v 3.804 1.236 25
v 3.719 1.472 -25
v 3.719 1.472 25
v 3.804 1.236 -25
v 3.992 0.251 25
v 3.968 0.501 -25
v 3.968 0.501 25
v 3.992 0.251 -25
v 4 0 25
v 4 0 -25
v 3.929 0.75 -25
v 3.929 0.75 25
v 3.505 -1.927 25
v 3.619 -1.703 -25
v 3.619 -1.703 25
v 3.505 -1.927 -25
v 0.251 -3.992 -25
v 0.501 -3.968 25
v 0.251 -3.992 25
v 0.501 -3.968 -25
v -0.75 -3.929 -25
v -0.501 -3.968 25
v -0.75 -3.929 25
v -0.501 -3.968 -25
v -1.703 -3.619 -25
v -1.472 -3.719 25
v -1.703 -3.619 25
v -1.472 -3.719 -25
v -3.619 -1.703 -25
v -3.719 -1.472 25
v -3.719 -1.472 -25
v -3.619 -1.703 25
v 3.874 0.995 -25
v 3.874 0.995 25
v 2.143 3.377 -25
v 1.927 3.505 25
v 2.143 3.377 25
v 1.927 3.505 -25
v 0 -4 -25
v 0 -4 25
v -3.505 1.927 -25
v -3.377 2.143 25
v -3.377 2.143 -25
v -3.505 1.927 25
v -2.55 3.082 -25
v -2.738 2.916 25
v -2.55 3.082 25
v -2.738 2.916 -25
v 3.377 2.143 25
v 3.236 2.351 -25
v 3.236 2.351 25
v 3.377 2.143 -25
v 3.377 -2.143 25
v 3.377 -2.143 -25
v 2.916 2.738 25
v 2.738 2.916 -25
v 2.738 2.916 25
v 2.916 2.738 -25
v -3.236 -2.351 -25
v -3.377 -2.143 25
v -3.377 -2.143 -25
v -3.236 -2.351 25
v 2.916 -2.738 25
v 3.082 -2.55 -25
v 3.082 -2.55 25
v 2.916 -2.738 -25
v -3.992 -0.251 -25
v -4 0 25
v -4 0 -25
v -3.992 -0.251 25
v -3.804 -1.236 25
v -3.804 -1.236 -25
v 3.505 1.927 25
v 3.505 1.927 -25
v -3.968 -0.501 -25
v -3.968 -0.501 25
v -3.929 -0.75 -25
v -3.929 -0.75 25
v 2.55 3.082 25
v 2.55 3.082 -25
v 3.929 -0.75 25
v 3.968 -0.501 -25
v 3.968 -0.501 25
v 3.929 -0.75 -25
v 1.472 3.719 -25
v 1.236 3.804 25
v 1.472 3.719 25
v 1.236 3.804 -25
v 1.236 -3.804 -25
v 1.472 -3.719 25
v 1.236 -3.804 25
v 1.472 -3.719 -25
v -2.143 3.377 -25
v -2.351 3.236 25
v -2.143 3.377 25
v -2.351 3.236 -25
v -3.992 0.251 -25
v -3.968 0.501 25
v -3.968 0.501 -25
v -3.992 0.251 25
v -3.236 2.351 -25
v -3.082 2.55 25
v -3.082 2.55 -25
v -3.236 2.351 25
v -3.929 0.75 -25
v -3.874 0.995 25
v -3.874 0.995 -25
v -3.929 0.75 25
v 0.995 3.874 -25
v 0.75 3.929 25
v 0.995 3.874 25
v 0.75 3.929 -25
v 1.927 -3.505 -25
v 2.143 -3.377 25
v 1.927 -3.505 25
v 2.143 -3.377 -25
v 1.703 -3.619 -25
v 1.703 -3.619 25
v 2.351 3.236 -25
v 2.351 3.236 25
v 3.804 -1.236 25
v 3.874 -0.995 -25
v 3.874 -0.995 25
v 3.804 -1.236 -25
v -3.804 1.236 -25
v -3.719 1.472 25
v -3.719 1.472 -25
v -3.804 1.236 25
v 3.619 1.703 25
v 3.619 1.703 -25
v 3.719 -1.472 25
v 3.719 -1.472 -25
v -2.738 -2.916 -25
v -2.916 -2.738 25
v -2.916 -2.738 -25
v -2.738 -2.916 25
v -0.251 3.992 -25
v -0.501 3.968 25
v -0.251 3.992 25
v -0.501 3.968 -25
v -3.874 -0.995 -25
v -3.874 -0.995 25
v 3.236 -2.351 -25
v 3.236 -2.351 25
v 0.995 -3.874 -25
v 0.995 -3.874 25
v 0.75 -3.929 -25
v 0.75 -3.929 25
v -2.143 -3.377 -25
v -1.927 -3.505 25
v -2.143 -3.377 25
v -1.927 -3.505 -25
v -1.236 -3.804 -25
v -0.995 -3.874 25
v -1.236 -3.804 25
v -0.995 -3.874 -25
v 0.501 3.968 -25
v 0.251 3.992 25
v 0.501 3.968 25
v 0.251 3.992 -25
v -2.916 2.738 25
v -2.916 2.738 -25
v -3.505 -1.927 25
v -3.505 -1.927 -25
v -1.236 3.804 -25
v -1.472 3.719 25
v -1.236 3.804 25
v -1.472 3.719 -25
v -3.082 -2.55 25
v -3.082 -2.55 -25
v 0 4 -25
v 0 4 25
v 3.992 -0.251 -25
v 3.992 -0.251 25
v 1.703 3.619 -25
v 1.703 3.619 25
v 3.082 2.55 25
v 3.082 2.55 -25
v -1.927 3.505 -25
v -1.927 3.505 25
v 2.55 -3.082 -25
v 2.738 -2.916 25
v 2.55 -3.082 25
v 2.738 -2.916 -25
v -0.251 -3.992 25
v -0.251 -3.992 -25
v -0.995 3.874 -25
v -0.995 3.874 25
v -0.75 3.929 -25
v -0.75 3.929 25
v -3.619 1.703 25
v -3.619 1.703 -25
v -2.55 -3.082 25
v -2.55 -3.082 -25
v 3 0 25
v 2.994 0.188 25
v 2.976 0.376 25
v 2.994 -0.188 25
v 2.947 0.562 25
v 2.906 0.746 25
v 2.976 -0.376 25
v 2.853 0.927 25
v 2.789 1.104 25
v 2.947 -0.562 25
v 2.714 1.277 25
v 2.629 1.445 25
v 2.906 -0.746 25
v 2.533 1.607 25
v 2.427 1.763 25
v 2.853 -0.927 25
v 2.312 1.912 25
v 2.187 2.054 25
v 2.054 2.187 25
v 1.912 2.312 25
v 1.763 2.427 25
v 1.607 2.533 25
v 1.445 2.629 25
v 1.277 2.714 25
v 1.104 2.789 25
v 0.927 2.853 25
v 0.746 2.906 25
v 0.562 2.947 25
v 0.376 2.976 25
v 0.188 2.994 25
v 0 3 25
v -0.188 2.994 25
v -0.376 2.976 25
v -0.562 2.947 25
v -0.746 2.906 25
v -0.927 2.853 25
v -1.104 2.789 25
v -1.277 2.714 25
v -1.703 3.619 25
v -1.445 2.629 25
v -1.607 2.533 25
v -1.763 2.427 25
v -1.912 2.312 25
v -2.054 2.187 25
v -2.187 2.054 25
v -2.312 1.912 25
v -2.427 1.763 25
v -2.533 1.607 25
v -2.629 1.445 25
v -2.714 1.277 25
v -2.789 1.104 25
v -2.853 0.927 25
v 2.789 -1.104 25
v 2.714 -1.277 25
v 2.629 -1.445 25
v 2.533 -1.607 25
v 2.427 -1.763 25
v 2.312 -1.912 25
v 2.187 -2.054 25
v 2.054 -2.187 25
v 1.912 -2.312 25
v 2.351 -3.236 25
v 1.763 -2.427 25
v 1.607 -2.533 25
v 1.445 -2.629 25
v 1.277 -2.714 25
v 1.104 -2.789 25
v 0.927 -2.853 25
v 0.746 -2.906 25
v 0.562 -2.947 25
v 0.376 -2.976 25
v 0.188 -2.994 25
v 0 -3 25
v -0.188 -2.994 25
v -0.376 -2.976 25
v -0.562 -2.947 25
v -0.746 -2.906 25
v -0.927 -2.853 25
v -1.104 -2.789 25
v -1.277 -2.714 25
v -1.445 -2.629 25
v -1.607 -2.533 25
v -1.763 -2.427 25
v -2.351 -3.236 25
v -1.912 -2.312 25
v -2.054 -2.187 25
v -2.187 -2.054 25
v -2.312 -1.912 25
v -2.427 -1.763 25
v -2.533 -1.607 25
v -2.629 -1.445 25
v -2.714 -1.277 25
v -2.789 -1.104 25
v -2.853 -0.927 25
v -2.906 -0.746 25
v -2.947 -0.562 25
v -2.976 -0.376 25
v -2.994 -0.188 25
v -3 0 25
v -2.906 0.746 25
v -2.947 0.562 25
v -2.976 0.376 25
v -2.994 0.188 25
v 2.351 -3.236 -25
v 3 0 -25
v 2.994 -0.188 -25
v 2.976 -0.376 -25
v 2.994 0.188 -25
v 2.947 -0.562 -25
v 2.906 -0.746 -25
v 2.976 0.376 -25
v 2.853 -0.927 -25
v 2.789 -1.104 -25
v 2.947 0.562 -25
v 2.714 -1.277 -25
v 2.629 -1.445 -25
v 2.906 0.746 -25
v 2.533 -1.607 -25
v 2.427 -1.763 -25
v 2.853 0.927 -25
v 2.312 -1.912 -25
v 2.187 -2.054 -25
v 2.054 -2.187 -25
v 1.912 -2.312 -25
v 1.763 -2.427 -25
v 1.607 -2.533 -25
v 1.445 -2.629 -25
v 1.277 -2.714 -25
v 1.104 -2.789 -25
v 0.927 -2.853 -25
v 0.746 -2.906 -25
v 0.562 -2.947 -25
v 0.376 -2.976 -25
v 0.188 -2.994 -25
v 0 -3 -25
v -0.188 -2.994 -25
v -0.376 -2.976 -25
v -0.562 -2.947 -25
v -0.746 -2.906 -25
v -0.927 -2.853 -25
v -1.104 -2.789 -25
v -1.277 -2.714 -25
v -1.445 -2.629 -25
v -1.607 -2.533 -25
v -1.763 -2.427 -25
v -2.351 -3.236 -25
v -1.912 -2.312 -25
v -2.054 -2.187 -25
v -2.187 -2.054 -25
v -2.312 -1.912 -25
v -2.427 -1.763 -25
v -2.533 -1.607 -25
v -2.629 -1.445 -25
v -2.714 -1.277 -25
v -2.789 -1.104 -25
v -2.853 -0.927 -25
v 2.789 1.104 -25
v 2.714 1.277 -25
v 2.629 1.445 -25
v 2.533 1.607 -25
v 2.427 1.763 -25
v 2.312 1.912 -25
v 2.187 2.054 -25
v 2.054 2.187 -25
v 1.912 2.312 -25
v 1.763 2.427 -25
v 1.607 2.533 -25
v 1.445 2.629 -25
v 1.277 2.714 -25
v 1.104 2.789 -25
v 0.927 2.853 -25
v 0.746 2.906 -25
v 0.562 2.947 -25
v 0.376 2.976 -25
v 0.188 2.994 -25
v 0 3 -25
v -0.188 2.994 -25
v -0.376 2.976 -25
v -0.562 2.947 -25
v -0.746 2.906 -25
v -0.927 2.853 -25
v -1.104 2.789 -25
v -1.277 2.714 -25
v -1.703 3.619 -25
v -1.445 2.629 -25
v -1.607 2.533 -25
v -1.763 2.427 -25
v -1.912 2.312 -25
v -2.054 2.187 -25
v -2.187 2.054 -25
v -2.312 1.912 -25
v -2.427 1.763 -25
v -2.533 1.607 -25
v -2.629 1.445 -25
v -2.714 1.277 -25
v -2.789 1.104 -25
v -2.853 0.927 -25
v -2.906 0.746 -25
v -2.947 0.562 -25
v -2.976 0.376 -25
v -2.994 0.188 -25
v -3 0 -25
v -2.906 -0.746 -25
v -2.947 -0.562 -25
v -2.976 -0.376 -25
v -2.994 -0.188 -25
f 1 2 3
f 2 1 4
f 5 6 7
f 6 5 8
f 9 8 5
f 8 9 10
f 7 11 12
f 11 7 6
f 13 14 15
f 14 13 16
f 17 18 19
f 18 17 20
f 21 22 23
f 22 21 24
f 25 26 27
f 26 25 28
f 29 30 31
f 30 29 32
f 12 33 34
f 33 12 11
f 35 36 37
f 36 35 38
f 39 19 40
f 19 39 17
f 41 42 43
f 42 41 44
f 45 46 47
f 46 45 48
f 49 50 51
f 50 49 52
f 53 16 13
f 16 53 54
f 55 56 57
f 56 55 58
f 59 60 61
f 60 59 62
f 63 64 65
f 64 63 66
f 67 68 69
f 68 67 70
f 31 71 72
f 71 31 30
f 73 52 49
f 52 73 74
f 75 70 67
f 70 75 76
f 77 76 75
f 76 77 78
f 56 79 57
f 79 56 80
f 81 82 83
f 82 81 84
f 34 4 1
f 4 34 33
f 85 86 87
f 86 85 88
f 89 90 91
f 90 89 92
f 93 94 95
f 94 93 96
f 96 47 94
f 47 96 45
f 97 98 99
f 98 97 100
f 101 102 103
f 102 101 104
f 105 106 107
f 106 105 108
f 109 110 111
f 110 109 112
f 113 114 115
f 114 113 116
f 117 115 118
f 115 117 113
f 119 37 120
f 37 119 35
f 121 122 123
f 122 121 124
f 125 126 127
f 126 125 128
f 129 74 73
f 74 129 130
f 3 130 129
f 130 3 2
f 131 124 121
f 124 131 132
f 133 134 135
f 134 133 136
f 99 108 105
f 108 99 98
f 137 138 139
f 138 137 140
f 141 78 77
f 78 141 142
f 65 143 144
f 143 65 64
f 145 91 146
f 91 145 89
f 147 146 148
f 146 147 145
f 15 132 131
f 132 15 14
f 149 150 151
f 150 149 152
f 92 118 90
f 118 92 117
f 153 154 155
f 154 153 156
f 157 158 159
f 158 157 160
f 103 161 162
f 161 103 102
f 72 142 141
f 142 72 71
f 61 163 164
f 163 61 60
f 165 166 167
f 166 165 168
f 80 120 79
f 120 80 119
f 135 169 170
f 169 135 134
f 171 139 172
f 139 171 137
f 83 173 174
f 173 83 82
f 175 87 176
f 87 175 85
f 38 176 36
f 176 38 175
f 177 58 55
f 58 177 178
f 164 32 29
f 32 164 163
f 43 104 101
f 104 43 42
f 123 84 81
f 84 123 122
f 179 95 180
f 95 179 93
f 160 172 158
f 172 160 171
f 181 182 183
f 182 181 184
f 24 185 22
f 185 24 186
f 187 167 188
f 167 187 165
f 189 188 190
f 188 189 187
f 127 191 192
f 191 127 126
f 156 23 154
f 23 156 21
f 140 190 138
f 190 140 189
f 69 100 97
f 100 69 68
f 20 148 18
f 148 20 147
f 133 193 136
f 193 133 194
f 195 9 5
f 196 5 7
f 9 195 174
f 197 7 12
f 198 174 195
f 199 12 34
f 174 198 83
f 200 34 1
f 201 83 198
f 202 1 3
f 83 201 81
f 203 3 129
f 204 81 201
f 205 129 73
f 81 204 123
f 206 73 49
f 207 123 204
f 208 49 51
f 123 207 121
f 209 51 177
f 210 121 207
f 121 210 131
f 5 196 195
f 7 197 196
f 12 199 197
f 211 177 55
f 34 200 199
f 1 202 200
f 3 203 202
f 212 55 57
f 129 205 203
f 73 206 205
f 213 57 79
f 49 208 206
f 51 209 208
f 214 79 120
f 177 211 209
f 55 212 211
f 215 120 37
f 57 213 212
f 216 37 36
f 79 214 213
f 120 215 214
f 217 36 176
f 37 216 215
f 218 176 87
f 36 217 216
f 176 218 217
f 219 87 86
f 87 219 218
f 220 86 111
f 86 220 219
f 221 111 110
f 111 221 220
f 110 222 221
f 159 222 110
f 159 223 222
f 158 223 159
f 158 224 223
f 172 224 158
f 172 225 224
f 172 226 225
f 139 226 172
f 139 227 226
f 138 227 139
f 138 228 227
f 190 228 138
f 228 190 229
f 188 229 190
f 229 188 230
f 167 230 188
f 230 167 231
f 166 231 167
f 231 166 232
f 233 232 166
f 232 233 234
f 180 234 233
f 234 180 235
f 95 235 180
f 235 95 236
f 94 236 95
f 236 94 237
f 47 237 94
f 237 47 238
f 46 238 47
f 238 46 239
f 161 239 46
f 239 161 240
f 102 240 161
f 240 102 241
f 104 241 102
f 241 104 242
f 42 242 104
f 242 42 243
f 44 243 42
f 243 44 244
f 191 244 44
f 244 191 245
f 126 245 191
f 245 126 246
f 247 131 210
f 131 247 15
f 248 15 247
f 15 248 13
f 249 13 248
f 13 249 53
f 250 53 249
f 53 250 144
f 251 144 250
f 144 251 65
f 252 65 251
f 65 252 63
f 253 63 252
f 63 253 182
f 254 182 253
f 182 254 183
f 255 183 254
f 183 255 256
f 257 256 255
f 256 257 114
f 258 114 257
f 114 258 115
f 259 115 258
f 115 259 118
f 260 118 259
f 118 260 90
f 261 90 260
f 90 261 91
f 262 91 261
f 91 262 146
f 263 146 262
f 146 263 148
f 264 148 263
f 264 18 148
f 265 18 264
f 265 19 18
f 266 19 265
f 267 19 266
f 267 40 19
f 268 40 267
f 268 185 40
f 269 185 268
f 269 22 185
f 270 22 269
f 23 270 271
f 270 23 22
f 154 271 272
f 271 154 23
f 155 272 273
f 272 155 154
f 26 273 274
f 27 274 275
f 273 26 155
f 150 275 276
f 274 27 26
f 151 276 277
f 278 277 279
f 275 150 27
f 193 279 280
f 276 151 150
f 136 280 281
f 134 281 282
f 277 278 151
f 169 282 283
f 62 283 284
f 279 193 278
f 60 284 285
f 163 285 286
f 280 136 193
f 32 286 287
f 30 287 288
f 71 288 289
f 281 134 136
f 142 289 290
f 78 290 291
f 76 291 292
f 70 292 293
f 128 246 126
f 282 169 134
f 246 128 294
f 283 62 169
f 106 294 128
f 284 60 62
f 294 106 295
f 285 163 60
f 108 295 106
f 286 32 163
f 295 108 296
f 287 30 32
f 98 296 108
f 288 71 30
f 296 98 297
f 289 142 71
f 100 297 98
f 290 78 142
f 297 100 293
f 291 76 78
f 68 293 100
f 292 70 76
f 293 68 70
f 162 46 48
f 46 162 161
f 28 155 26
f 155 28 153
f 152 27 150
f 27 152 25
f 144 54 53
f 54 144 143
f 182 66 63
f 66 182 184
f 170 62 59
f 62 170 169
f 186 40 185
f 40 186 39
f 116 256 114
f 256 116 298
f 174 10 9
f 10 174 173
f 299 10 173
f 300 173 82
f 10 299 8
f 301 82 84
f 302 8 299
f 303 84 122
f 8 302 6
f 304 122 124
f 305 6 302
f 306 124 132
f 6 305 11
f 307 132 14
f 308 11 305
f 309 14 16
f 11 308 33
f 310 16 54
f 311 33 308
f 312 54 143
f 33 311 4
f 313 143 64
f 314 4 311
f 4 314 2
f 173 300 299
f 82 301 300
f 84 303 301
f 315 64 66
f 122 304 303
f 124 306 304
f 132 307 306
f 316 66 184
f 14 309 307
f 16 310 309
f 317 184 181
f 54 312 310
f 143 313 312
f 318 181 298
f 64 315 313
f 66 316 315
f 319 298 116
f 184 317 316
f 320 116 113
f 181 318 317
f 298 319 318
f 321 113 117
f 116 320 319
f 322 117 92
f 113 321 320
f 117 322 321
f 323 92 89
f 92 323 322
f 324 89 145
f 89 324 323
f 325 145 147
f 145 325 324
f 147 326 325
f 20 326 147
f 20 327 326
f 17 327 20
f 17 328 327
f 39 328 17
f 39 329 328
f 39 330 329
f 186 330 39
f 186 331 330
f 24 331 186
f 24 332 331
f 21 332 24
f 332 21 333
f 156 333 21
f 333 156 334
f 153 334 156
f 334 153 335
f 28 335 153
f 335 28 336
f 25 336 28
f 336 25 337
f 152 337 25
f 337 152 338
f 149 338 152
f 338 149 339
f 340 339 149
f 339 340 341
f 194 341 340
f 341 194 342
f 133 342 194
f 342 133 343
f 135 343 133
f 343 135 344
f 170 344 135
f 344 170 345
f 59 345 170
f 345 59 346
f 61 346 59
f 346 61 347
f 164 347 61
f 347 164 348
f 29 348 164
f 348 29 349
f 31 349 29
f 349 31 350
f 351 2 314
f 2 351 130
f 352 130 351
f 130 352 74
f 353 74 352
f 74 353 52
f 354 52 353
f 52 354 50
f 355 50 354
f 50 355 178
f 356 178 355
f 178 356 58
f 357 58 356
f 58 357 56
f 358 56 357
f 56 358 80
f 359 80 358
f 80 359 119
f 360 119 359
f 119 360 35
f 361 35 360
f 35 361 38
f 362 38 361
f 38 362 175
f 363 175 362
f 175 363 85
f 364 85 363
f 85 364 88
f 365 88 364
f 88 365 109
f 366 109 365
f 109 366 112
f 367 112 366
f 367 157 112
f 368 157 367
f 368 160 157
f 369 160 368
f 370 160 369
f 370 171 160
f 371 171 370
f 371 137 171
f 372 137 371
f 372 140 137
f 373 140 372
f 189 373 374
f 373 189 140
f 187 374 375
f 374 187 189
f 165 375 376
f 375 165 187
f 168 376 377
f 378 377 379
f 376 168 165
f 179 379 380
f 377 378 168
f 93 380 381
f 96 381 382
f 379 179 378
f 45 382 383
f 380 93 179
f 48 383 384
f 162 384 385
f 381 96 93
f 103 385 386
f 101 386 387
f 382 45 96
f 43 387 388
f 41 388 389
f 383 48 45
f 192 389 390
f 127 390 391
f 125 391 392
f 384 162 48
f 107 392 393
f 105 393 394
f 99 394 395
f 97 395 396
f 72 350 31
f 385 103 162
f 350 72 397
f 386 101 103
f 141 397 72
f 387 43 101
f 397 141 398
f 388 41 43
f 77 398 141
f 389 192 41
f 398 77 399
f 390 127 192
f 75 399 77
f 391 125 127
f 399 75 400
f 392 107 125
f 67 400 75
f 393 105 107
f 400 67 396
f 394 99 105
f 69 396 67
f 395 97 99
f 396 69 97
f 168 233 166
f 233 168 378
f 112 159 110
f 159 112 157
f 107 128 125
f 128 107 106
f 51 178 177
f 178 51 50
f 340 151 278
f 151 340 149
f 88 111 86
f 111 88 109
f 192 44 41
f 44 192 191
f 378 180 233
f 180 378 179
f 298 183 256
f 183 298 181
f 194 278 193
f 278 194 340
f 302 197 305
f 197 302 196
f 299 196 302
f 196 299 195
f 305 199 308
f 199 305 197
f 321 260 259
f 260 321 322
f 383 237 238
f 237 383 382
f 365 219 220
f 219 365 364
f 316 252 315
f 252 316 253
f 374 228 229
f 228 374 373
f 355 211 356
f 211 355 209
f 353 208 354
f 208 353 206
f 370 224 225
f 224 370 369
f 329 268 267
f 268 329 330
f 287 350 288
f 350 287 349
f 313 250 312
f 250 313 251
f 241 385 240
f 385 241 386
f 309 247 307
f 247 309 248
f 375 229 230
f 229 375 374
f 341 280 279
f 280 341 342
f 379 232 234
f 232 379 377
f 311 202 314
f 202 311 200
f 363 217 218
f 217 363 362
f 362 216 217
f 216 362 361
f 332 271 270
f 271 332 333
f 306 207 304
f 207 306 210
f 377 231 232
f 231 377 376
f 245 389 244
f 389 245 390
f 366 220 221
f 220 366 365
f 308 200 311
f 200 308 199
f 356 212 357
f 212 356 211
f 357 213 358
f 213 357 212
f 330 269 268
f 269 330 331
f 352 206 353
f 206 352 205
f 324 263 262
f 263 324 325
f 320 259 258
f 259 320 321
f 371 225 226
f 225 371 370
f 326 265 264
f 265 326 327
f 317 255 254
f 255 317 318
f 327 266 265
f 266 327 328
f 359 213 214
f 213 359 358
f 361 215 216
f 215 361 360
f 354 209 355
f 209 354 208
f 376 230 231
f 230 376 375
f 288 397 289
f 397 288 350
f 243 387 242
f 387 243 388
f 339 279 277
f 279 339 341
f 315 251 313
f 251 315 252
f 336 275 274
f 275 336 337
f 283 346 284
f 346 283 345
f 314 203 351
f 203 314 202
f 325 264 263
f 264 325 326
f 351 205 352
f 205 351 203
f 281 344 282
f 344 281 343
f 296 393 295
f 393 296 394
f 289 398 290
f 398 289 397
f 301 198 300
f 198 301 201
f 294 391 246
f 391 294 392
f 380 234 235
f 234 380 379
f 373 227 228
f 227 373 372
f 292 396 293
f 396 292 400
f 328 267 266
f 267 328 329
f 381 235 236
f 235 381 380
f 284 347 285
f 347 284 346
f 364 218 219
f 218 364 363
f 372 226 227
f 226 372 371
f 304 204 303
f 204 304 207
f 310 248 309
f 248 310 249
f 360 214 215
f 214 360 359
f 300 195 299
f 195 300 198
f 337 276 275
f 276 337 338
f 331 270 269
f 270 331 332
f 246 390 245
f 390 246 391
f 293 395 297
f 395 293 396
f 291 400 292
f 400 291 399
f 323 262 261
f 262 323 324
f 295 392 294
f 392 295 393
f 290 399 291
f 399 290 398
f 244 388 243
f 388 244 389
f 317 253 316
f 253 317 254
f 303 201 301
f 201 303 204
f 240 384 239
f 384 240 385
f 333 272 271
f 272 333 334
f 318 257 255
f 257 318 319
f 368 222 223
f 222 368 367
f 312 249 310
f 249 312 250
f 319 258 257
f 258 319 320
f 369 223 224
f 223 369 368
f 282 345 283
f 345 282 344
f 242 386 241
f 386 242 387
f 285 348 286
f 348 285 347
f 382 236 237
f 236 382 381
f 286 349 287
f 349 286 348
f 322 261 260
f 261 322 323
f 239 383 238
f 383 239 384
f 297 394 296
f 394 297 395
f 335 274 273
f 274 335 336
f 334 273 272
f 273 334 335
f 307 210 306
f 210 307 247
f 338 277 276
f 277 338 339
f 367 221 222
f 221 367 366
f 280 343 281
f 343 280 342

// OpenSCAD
$fn = 100;
difference() {
cylinder(50,4,4, true);
cylinder(55,3,3, true);  
}
